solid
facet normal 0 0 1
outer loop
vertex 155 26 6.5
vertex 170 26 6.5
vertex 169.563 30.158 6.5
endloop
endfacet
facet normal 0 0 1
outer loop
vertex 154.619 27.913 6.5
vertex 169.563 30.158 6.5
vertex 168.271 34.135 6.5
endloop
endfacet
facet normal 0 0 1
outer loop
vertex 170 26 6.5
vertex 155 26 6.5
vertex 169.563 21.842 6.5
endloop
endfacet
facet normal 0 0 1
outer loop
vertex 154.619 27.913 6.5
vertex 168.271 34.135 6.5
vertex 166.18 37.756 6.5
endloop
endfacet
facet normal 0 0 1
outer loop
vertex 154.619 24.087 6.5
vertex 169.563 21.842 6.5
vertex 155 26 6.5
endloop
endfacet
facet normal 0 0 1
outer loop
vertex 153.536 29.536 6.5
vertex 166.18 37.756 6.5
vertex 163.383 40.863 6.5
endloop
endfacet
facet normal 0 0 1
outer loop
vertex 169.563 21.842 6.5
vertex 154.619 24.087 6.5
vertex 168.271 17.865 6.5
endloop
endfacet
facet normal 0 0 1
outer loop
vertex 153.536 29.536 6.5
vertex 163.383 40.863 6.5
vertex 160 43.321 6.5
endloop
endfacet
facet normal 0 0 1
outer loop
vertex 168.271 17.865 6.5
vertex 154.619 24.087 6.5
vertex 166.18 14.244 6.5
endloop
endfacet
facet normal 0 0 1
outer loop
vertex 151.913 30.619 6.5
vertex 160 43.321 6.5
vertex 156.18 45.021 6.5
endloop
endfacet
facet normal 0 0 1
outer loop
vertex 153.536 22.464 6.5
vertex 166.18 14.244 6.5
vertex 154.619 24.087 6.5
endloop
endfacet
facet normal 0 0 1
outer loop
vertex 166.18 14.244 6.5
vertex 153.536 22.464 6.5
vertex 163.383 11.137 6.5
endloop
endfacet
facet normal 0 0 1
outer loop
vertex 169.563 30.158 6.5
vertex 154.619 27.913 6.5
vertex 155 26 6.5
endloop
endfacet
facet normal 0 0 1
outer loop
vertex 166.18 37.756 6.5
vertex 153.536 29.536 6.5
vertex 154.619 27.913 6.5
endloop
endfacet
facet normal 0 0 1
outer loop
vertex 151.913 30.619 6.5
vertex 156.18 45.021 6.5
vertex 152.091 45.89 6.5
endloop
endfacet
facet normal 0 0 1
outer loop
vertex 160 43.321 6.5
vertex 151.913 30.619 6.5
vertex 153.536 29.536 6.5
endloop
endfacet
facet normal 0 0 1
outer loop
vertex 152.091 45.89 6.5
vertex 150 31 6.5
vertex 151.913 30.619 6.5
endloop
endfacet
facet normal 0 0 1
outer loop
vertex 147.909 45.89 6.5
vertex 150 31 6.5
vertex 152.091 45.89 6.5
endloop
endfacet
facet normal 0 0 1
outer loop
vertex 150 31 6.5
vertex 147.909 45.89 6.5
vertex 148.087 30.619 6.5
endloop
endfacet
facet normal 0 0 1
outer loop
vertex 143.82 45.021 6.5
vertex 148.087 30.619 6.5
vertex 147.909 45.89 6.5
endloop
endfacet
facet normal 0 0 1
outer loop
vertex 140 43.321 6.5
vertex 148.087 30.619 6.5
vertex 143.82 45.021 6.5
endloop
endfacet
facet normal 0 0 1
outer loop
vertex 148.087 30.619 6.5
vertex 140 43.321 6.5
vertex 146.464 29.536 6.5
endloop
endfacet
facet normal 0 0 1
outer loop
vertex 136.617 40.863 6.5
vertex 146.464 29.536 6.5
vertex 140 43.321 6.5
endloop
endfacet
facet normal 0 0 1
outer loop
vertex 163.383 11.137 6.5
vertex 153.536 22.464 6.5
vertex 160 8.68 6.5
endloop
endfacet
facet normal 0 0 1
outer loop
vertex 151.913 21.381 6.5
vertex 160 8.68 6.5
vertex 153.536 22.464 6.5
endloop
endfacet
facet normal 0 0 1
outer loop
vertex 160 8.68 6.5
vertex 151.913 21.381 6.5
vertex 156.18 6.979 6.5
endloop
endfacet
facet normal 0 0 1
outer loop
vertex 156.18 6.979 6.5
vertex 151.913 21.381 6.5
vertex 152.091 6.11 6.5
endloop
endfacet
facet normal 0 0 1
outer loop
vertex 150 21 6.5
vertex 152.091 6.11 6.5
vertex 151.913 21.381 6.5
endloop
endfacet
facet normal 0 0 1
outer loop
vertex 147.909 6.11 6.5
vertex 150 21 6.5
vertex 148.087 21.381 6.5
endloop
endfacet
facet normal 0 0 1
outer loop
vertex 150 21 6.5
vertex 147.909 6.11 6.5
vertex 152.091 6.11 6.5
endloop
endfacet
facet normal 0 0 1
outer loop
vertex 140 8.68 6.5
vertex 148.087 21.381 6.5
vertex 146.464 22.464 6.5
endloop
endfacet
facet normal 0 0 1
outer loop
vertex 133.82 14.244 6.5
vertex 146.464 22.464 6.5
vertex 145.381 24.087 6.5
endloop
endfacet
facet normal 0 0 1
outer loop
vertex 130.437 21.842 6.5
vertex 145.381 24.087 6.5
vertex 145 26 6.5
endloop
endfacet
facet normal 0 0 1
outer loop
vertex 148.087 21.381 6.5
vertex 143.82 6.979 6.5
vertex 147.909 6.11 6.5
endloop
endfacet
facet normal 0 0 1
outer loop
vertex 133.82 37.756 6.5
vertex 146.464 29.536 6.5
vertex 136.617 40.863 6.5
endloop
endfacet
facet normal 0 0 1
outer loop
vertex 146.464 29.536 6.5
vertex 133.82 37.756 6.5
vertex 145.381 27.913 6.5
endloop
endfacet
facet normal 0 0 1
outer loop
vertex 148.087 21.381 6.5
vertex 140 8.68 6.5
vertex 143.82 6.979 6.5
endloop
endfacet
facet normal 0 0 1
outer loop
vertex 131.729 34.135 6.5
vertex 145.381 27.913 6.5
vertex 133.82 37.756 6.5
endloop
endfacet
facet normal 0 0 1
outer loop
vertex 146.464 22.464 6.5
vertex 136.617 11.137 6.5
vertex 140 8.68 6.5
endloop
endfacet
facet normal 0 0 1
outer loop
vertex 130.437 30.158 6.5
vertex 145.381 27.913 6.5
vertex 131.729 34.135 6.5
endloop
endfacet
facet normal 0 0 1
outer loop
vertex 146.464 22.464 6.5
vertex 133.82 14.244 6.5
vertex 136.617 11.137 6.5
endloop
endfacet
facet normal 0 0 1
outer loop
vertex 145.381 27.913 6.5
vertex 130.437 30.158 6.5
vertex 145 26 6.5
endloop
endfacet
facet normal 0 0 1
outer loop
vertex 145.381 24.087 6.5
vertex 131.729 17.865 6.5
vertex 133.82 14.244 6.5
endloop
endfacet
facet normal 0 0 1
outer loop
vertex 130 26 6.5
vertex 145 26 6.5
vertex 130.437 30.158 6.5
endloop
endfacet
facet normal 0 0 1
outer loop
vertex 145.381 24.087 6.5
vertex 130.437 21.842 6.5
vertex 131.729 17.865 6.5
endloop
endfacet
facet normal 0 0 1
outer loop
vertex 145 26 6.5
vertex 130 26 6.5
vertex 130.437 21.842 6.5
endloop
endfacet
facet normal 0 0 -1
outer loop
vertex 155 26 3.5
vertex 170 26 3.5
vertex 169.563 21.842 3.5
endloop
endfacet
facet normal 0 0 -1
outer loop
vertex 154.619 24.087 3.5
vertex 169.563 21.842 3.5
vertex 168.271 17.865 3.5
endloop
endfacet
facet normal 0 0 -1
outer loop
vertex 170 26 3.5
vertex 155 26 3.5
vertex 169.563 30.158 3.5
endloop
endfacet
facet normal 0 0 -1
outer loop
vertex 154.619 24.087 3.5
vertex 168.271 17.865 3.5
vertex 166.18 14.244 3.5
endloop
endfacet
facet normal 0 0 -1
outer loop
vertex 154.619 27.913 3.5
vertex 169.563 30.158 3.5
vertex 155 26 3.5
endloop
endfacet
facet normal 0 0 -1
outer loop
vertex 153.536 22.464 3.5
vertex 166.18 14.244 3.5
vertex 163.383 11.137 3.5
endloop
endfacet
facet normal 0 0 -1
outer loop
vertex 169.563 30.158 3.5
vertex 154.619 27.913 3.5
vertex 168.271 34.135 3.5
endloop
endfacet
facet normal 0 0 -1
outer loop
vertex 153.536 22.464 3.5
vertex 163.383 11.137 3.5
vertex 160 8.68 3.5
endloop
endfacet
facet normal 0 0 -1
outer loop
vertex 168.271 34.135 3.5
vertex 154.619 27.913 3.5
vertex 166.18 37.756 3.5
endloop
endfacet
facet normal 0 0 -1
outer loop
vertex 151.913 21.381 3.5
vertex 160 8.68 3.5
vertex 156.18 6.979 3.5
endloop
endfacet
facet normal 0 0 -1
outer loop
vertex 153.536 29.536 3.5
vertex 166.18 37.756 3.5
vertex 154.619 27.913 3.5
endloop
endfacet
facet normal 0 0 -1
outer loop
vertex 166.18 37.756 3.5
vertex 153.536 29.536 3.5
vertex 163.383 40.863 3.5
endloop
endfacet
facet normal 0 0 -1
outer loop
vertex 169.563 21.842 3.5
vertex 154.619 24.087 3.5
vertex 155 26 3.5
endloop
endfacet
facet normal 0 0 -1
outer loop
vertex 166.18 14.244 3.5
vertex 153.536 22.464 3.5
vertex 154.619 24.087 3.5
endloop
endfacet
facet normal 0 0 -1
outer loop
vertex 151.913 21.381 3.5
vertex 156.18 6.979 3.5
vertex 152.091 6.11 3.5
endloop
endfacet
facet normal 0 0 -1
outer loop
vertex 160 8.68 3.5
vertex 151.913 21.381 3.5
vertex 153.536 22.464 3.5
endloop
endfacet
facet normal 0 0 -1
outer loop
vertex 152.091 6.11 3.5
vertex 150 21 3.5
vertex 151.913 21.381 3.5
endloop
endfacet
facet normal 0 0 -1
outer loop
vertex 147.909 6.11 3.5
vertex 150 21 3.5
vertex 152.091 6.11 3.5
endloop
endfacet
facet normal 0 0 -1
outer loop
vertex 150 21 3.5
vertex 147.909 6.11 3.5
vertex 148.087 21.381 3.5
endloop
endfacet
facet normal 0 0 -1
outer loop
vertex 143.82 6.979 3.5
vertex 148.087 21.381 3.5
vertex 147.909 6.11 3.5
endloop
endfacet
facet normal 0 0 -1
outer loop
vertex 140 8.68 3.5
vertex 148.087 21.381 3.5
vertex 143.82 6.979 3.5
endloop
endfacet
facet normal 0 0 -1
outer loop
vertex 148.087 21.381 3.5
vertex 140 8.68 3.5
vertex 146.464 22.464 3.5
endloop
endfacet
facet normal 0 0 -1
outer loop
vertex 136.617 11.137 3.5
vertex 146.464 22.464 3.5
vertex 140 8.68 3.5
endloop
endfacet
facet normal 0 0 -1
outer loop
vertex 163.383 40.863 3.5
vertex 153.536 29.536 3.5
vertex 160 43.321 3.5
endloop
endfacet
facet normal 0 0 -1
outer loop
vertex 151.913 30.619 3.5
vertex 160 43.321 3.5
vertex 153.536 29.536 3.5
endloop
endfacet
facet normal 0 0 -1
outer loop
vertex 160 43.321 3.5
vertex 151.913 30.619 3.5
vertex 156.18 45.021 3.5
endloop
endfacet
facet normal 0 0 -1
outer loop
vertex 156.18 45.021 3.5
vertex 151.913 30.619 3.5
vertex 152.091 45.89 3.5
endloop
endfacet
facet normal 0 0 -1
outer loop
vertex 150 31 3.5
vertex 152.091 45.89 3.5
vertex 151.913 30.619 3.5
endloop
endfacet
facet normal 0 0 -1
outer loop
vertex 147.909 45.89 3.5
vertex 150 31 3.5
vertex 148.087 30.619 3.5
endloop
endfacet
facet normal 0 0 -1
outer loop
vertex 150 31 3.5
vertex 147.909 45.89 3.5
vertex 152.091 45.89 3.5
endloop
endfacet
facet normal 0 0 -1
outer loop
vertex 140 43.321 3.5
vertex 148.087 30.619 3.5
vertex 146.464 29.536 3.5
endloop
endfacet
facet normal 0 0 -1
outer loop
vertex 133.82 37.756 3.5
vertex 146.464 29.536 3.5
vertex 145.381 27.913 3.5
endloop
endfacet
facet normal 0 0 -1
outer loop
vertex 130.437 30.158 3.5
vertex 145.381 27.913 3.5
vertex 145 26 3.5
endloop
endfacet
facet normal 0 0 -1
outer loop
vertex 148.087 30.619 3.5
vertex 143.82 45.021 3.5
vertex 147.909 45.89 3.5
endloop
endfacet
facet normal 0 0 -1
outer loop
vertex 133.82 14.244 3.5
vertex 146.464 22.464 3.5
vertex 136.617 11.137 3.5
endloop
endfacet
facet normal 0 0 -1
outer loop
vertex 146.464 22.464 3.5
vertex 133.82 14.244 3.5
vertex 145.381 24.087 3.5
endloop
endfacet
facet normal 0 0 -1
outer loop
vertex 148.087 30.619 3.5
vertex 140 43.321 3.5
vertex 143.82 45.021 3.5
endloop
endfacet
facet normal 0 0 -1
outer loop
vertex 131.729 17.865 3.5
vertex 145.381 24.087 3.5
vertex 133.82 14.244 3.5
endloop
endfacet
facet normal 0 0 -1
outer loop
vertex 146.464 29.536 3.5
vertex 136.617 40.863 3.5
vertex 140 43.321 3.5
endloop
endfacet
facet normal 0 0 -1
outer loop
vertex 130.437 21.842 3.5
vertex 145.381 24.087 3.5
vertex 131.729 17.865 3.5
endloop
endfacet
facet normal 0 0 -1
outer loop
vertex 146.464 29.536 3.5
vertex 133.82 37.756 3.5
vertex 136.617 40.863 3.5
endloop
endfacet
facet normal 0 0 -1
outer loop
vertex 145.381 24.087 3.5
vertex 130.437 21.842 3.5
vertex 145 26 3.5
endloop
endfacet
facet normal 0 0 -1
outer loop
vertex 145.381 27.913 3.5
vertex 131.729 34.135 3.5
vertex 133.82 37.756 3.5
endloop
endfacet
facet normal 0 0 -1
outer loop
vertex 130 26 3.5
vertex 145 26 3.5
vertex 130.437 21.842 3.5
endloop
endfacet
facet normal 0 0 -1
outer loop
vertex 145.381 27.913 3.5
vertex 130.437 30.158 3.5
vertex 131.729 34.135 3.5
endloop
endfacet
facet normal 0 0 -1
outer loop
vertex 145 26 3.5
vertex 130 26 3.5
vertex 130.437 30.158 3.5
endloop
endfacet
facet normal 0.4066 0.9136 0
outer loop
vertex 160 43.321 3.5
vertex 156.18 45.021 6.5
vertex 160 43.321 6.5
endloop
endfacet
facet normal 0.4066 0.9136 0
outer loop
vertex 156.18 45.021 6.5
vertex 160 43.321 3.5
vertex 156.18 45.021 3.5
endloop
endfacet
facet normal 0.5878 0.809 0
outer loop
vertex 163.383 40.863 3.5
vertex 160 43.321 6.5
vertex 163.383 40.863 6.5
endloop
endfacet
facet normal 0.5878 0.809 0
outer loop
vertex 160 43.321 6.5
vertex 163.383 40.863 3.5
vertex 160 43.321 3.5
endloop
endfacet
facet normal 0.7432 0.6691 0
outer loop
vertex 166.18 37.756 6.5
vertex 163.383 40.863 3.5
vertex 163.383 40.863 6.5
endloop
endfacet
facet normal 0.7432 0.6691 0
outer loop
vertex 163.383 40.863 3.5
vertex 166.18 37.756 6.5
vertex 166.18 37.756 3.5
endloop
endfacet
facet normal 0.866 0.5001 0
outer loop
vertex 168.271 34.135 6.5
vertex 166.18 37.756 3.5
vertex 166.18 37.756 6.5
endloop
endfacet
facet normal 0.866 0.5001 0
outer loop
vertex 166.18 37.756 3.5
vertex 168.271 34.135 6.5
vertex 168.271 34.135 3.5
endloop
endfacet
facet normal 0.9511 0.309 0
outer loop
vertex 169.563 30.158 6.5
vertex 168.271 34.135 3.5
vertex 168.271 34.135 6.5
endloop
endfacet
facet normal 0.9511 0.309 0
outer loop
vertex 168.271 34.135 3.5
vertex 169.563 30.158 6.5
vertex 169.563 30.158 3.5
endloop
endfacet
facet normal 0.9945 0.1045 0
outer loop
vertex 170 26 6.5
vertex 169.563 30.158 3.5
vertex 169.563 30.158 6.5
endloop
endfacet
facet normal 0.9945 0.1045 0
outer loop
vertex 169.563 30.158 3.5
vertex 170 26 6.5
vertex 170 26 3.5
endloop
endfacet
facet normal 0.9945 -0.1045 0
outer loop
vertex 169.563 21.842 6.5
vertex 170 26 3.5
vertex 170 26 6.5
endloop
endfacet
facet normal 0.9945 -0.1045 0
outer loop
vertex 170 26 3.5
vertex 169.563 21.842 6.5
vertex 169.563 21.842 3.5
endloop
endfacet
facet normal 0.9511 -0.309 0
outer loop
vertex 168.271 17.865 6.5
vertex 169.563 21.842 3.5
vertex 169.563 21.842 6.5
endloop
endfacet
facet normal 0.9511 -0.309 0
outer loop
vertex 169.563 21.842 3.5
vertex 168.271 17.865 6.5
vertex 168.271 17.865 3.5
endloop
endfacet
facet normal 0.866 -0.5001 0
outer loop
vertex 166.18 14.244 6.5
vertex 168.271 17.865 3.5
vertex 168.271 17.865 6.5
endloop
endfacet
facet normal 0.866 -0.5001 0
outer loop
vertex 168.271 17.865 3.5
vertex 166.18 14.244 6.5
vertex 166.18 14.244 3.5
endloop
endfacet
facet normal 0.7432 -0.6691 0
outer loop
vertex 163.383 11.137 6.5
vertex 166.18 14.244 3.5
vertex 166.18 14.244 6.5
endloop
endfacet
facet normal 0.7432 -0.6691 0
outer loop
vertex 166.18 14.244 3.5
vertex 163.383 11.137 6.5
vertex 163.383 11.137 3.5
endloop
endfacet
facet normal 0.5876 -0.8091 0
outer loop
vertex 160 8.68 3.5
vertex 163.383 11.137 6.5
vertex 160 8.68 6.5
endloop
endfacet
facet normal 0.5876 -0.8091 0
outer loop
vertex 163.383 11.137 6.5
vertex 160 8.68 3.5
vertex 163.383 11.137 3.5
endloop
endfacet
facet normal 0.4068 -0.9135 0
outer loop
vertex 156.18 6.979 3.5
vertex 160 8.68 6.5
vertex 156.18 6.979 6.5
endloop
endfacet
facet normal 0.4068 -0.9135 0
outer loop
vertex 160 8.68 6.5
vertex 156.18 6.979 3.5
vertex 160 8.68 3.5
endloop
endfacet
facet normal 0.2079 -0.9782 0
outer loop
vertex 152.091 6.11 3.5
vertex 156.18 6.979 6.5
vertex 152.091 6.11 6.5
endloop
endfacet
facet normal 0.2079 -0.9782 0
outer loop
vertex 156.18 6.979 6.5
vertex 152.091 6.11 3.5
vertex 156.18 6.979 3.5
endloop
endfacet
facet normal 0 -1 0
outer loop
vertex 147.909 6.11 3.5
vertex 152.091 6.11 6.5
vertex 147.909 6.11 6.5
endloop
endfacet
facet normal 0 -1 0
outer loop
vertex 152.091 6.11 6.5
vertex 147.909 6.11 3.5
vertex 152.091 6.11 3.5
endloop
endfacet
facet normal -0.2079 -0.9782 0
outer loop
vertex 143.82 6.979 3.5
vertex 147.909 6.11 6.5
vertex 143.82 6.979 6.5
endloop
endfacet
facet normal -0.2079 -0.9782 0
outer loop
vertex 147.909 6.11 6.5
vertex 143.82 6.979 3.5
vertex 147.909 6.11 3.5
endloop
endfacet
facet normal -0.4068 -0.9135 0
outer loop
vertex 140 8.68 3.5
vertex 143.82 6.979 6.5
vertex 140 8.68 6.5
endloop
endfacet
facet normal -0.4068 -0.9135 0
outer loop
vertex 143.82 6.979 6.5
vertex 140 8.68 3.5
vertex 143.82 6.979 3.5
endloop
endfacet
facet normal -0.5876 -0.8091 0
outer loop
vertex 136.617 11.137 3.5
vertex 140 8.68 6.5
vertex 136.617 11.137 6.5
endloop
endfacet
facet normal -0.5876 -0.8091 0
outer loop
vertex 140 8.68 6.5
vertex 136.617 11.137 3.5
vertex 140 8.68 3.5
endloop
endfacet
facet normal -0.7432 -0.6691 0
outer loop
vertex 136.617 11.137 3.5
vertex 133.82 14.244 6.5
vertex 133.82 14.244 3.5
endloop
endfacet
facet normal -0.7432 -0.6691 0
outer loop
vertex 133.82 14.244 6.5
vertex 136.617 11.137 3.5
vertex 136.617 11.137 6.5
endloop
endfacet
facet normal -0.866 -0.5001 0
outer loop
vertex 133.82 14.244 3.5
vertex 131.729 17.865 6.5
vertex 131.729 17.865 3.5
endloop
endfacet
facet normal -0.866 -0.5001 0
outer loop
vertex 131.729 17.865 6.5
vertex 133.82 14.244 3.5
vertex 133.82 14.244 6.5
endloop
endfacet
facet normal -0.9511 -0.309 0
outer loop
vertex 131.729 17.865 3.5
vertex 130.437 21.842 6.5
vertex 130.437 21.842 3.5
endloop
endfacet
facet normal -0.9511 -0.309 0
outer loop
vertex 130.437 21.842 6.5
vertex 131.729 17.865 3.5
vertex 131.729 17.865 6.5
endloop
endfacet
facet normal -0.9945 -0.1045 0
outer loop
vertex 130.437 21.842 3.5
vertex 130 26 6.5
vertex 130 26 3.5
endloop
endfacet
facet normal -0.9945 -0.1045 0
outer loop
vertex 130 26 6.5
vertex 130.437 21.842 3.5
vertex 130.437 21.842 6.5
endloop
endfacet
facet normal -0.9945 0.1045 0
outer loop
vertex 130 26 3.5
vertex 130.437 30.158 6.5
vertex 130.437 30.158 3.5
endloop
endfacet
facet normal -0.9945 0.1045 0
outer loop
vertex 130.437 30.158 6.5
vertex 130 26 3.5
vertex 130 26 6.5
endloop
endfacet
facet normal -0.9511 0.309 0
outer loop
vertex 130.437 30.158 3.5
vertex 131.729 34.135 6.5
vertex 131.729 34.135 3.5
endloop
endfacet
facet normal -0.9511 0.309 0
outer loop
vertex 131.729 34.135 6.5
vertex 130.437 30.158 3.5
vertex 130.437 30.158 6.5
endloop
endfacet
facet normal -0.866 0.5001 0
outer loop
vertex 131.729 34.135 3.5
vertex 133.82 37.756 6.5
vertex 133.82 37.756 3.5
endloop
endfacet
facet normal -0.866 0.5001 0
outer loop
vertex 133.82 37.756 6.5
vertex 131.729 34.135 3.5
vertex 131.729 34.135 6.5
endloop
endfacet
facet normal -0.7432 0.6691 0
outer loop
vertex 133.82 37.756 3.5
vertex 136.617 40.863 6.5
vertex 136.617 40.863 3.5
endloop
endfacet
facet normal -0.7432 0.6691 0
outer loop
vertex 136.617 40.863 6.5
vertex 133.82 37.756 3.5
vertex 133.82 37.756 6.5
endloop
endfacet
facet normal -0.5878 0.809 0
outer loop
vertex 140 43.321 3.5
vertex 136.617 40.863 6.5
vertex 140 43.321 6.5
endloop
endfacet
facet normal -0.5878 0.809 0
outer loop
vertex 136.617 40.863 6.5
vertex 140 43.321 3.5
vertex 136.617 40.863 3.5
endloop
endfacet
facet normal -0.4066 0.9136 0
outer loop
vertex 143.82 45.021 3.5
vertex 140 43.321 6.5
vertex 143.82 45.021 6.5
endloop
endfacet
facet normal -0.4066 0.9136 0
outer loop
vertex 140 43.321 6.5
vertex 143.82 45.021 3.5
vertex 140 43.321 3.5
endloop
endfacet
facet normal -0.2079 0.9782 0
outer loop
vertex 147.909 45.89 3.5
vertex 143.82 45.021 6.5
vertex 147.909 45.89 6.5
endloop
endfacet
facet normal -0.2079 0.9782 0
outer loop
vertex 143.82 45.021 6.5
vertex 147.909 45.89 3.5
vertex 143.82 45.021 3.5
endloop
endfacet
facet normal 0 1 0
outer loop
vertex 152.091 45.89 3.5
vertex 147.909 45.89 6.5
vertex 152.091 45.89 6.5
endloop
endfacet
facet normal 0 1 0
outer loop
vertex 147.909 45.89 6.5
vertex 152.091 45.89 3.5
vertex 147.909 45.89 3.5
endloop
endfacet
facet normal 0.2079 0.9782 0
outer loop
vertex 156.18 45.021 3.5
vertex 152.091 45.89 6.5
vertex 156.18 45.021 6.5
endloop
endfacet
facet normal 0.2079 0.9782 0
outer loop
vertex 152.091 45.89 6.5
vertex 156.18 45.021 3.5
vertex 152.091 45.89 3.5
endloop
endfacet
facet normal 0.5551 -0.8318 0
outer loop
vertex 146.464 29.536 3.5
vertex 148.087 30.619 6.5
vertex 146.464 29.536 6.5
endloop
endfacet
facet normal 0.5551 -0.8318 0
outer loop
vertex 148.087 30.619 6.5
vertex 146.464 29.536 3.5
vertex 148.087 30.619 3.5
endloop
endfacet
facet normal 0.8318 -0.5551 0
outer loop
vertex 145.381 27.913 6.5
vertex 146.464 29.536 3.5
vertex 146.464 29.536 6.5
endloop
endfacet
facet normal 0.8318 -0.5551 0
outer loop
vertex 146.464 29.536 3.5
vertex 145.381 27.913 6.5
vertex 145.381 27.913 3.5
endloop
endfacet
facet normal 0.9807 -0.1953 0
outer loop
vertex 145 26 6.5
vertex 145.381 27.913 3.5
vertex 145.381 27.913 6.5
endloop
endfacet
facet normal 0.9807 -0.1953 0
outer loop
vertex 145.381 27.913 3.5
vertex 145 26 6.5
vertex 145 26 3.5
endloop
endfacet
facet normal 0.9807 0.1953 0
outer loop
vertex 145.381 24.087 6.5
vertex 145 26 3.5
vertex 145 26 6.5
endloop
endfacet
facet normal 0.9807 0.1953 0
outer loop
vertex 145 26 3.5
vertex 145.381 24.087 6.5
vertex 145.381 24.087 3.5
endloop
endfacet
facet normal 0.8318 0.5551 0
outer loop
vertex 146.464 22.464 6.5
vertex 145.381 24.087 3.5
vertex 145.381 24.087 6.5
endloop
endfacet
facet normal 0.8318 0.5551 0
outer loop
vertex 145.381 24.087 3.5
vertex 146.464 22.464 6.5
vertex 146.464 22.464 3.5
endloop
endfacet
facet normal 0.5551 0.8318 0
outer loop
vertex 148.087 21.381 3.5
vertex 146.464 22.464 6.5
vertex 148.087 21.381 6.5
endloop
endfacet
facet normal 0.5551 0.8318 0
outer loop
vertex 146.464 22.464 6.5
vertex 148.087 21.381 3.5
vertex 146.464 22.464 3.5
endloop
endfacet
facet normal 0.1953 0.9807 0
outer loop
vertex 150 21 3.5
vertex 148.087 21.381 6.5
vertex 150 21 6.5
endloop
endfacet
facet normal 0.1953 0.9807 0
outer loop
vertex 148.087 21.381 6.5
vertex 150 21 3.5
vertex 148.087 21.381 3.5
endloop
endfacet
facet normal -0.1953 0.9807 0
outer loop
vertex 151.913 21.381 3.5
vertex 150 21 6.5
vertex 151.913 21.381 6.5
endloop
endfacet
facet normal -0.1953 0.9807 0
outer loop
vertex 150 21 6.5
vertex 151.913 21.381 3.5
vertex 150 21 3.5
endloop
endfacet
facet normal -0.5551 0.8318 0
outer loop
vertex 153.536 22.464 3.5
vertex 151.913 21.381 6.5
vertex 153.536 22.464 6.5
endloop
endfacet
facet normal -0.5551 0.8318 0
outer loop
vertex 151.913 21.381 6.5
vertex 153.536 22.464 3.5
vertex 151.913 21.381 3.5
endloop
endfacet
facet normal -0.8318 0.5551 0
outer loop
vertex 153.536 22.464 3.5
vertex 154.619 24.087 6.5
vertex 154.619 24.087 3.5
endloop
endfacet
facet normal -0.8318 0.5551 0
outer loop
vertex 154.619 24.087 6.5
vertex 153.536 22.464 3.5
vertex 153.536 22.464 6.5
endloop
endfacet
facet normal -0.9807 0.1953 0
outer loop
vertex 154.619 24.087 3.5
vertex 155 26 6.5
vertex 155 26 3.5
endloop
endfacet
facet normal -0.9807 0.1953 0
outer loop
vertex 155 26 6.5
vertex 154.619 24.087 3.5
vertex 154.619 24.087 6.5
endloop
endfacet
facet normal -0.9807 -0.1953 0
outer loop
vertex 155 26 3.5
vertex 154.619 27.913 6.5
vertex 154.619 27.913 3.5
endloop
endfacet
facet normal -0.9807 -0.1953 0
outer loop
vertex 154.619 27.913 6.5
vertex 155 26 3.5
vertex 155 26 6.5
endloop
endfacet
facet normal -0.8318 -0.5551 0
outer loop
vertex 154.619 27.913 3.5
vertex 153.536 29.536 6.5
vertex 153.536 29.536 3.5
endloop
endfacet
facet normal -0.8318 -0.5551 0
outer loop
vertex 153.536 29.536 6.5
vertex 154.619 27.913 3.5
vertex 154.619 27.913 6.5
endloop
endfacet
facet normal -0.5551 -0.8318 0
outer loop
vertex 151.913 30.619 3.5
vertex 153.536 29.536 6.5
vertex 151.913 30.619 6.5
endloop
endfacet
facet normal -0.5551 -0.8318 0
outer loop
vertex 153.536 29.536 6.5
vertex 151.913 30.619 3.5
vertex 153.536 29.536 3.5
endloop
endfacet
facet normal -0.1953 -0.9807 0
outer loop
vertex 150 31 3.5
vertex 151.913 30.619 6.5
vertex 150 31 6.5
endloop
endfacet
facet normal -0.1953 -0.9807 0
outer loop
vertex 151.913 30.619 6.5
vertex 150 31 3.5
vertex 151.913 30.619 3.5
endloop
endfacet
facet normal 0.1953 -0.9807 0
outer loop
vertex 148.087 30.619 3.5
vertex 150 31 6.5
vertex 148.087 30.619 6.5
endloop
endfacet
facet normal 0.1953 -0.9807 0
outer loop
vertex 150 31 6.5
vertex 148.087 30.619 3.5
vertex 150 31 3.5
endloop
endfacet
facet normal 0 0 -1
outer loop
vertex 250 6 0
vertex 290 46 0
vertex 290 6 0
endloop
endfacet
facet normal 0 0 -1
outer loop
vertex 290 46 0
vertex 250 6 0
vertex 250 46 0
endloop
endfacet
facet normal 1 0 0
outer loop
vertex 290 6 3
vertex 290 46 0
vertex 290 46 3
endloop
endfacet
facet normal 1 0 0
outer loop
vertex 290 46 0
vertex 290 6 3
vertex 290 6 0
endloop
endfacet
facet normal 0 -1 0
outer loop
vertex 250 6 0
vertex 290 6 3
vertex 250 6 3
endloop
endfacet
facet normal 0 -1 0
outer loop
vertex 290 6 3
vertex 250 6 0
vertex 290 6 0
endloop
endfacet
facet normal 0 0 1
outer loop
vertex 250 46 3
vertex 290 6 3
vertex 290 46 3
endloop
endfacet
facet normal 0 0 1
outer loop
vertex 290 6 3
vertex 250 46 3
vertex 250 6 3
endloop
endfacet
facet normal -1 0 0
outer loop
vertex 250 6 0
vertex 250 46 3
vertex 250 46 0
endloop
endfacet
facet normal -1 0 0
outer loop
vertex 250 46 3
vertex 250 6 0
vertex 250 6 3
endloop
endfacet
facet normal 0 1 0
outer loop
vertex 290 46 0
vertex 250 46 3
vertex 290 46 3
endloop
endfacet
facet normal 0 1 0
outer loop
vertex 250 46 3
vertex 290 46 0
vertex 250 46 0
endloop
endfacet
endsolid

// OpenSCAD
module donut_jaw_2d() {
    union() {
        difference() {
            union() {
                import("extrude_svgs/jaw.dxf");
                translate([210,26,0]) 
                circle(20);
            }
            translate([210,26,0]) 
            circle(5);
        }
        //%translate([170,0,0]) square(60);
    }
}

module donut_square_2d() {
    union() {
        import("extrude_svgs/jaw.dxf");
        translate([210,26,0]) square(40,true);
    }
}

module donut_jaw() {
    linear_extrude(3) {
        donut_jaw_2d();
    }
}

module donut_square() {
    linear_extrude(3) {
        donut_square_2d();
    }
}

module cog() {
    linear_extrude(6) {
        import("extrude_svgs/cog.dxf");
    }
}

module assm(diff) {
    rotate([180,0,0])
    translate([-diff,-52,-6.5])
    donut_jaw();
    translate([diff,0,0])
    donut_square();
    translate([83,26,0])
    rotate([0,0,-5])
    cog();
}

assm(60);
translate([0,0,10])
%assm(0);
